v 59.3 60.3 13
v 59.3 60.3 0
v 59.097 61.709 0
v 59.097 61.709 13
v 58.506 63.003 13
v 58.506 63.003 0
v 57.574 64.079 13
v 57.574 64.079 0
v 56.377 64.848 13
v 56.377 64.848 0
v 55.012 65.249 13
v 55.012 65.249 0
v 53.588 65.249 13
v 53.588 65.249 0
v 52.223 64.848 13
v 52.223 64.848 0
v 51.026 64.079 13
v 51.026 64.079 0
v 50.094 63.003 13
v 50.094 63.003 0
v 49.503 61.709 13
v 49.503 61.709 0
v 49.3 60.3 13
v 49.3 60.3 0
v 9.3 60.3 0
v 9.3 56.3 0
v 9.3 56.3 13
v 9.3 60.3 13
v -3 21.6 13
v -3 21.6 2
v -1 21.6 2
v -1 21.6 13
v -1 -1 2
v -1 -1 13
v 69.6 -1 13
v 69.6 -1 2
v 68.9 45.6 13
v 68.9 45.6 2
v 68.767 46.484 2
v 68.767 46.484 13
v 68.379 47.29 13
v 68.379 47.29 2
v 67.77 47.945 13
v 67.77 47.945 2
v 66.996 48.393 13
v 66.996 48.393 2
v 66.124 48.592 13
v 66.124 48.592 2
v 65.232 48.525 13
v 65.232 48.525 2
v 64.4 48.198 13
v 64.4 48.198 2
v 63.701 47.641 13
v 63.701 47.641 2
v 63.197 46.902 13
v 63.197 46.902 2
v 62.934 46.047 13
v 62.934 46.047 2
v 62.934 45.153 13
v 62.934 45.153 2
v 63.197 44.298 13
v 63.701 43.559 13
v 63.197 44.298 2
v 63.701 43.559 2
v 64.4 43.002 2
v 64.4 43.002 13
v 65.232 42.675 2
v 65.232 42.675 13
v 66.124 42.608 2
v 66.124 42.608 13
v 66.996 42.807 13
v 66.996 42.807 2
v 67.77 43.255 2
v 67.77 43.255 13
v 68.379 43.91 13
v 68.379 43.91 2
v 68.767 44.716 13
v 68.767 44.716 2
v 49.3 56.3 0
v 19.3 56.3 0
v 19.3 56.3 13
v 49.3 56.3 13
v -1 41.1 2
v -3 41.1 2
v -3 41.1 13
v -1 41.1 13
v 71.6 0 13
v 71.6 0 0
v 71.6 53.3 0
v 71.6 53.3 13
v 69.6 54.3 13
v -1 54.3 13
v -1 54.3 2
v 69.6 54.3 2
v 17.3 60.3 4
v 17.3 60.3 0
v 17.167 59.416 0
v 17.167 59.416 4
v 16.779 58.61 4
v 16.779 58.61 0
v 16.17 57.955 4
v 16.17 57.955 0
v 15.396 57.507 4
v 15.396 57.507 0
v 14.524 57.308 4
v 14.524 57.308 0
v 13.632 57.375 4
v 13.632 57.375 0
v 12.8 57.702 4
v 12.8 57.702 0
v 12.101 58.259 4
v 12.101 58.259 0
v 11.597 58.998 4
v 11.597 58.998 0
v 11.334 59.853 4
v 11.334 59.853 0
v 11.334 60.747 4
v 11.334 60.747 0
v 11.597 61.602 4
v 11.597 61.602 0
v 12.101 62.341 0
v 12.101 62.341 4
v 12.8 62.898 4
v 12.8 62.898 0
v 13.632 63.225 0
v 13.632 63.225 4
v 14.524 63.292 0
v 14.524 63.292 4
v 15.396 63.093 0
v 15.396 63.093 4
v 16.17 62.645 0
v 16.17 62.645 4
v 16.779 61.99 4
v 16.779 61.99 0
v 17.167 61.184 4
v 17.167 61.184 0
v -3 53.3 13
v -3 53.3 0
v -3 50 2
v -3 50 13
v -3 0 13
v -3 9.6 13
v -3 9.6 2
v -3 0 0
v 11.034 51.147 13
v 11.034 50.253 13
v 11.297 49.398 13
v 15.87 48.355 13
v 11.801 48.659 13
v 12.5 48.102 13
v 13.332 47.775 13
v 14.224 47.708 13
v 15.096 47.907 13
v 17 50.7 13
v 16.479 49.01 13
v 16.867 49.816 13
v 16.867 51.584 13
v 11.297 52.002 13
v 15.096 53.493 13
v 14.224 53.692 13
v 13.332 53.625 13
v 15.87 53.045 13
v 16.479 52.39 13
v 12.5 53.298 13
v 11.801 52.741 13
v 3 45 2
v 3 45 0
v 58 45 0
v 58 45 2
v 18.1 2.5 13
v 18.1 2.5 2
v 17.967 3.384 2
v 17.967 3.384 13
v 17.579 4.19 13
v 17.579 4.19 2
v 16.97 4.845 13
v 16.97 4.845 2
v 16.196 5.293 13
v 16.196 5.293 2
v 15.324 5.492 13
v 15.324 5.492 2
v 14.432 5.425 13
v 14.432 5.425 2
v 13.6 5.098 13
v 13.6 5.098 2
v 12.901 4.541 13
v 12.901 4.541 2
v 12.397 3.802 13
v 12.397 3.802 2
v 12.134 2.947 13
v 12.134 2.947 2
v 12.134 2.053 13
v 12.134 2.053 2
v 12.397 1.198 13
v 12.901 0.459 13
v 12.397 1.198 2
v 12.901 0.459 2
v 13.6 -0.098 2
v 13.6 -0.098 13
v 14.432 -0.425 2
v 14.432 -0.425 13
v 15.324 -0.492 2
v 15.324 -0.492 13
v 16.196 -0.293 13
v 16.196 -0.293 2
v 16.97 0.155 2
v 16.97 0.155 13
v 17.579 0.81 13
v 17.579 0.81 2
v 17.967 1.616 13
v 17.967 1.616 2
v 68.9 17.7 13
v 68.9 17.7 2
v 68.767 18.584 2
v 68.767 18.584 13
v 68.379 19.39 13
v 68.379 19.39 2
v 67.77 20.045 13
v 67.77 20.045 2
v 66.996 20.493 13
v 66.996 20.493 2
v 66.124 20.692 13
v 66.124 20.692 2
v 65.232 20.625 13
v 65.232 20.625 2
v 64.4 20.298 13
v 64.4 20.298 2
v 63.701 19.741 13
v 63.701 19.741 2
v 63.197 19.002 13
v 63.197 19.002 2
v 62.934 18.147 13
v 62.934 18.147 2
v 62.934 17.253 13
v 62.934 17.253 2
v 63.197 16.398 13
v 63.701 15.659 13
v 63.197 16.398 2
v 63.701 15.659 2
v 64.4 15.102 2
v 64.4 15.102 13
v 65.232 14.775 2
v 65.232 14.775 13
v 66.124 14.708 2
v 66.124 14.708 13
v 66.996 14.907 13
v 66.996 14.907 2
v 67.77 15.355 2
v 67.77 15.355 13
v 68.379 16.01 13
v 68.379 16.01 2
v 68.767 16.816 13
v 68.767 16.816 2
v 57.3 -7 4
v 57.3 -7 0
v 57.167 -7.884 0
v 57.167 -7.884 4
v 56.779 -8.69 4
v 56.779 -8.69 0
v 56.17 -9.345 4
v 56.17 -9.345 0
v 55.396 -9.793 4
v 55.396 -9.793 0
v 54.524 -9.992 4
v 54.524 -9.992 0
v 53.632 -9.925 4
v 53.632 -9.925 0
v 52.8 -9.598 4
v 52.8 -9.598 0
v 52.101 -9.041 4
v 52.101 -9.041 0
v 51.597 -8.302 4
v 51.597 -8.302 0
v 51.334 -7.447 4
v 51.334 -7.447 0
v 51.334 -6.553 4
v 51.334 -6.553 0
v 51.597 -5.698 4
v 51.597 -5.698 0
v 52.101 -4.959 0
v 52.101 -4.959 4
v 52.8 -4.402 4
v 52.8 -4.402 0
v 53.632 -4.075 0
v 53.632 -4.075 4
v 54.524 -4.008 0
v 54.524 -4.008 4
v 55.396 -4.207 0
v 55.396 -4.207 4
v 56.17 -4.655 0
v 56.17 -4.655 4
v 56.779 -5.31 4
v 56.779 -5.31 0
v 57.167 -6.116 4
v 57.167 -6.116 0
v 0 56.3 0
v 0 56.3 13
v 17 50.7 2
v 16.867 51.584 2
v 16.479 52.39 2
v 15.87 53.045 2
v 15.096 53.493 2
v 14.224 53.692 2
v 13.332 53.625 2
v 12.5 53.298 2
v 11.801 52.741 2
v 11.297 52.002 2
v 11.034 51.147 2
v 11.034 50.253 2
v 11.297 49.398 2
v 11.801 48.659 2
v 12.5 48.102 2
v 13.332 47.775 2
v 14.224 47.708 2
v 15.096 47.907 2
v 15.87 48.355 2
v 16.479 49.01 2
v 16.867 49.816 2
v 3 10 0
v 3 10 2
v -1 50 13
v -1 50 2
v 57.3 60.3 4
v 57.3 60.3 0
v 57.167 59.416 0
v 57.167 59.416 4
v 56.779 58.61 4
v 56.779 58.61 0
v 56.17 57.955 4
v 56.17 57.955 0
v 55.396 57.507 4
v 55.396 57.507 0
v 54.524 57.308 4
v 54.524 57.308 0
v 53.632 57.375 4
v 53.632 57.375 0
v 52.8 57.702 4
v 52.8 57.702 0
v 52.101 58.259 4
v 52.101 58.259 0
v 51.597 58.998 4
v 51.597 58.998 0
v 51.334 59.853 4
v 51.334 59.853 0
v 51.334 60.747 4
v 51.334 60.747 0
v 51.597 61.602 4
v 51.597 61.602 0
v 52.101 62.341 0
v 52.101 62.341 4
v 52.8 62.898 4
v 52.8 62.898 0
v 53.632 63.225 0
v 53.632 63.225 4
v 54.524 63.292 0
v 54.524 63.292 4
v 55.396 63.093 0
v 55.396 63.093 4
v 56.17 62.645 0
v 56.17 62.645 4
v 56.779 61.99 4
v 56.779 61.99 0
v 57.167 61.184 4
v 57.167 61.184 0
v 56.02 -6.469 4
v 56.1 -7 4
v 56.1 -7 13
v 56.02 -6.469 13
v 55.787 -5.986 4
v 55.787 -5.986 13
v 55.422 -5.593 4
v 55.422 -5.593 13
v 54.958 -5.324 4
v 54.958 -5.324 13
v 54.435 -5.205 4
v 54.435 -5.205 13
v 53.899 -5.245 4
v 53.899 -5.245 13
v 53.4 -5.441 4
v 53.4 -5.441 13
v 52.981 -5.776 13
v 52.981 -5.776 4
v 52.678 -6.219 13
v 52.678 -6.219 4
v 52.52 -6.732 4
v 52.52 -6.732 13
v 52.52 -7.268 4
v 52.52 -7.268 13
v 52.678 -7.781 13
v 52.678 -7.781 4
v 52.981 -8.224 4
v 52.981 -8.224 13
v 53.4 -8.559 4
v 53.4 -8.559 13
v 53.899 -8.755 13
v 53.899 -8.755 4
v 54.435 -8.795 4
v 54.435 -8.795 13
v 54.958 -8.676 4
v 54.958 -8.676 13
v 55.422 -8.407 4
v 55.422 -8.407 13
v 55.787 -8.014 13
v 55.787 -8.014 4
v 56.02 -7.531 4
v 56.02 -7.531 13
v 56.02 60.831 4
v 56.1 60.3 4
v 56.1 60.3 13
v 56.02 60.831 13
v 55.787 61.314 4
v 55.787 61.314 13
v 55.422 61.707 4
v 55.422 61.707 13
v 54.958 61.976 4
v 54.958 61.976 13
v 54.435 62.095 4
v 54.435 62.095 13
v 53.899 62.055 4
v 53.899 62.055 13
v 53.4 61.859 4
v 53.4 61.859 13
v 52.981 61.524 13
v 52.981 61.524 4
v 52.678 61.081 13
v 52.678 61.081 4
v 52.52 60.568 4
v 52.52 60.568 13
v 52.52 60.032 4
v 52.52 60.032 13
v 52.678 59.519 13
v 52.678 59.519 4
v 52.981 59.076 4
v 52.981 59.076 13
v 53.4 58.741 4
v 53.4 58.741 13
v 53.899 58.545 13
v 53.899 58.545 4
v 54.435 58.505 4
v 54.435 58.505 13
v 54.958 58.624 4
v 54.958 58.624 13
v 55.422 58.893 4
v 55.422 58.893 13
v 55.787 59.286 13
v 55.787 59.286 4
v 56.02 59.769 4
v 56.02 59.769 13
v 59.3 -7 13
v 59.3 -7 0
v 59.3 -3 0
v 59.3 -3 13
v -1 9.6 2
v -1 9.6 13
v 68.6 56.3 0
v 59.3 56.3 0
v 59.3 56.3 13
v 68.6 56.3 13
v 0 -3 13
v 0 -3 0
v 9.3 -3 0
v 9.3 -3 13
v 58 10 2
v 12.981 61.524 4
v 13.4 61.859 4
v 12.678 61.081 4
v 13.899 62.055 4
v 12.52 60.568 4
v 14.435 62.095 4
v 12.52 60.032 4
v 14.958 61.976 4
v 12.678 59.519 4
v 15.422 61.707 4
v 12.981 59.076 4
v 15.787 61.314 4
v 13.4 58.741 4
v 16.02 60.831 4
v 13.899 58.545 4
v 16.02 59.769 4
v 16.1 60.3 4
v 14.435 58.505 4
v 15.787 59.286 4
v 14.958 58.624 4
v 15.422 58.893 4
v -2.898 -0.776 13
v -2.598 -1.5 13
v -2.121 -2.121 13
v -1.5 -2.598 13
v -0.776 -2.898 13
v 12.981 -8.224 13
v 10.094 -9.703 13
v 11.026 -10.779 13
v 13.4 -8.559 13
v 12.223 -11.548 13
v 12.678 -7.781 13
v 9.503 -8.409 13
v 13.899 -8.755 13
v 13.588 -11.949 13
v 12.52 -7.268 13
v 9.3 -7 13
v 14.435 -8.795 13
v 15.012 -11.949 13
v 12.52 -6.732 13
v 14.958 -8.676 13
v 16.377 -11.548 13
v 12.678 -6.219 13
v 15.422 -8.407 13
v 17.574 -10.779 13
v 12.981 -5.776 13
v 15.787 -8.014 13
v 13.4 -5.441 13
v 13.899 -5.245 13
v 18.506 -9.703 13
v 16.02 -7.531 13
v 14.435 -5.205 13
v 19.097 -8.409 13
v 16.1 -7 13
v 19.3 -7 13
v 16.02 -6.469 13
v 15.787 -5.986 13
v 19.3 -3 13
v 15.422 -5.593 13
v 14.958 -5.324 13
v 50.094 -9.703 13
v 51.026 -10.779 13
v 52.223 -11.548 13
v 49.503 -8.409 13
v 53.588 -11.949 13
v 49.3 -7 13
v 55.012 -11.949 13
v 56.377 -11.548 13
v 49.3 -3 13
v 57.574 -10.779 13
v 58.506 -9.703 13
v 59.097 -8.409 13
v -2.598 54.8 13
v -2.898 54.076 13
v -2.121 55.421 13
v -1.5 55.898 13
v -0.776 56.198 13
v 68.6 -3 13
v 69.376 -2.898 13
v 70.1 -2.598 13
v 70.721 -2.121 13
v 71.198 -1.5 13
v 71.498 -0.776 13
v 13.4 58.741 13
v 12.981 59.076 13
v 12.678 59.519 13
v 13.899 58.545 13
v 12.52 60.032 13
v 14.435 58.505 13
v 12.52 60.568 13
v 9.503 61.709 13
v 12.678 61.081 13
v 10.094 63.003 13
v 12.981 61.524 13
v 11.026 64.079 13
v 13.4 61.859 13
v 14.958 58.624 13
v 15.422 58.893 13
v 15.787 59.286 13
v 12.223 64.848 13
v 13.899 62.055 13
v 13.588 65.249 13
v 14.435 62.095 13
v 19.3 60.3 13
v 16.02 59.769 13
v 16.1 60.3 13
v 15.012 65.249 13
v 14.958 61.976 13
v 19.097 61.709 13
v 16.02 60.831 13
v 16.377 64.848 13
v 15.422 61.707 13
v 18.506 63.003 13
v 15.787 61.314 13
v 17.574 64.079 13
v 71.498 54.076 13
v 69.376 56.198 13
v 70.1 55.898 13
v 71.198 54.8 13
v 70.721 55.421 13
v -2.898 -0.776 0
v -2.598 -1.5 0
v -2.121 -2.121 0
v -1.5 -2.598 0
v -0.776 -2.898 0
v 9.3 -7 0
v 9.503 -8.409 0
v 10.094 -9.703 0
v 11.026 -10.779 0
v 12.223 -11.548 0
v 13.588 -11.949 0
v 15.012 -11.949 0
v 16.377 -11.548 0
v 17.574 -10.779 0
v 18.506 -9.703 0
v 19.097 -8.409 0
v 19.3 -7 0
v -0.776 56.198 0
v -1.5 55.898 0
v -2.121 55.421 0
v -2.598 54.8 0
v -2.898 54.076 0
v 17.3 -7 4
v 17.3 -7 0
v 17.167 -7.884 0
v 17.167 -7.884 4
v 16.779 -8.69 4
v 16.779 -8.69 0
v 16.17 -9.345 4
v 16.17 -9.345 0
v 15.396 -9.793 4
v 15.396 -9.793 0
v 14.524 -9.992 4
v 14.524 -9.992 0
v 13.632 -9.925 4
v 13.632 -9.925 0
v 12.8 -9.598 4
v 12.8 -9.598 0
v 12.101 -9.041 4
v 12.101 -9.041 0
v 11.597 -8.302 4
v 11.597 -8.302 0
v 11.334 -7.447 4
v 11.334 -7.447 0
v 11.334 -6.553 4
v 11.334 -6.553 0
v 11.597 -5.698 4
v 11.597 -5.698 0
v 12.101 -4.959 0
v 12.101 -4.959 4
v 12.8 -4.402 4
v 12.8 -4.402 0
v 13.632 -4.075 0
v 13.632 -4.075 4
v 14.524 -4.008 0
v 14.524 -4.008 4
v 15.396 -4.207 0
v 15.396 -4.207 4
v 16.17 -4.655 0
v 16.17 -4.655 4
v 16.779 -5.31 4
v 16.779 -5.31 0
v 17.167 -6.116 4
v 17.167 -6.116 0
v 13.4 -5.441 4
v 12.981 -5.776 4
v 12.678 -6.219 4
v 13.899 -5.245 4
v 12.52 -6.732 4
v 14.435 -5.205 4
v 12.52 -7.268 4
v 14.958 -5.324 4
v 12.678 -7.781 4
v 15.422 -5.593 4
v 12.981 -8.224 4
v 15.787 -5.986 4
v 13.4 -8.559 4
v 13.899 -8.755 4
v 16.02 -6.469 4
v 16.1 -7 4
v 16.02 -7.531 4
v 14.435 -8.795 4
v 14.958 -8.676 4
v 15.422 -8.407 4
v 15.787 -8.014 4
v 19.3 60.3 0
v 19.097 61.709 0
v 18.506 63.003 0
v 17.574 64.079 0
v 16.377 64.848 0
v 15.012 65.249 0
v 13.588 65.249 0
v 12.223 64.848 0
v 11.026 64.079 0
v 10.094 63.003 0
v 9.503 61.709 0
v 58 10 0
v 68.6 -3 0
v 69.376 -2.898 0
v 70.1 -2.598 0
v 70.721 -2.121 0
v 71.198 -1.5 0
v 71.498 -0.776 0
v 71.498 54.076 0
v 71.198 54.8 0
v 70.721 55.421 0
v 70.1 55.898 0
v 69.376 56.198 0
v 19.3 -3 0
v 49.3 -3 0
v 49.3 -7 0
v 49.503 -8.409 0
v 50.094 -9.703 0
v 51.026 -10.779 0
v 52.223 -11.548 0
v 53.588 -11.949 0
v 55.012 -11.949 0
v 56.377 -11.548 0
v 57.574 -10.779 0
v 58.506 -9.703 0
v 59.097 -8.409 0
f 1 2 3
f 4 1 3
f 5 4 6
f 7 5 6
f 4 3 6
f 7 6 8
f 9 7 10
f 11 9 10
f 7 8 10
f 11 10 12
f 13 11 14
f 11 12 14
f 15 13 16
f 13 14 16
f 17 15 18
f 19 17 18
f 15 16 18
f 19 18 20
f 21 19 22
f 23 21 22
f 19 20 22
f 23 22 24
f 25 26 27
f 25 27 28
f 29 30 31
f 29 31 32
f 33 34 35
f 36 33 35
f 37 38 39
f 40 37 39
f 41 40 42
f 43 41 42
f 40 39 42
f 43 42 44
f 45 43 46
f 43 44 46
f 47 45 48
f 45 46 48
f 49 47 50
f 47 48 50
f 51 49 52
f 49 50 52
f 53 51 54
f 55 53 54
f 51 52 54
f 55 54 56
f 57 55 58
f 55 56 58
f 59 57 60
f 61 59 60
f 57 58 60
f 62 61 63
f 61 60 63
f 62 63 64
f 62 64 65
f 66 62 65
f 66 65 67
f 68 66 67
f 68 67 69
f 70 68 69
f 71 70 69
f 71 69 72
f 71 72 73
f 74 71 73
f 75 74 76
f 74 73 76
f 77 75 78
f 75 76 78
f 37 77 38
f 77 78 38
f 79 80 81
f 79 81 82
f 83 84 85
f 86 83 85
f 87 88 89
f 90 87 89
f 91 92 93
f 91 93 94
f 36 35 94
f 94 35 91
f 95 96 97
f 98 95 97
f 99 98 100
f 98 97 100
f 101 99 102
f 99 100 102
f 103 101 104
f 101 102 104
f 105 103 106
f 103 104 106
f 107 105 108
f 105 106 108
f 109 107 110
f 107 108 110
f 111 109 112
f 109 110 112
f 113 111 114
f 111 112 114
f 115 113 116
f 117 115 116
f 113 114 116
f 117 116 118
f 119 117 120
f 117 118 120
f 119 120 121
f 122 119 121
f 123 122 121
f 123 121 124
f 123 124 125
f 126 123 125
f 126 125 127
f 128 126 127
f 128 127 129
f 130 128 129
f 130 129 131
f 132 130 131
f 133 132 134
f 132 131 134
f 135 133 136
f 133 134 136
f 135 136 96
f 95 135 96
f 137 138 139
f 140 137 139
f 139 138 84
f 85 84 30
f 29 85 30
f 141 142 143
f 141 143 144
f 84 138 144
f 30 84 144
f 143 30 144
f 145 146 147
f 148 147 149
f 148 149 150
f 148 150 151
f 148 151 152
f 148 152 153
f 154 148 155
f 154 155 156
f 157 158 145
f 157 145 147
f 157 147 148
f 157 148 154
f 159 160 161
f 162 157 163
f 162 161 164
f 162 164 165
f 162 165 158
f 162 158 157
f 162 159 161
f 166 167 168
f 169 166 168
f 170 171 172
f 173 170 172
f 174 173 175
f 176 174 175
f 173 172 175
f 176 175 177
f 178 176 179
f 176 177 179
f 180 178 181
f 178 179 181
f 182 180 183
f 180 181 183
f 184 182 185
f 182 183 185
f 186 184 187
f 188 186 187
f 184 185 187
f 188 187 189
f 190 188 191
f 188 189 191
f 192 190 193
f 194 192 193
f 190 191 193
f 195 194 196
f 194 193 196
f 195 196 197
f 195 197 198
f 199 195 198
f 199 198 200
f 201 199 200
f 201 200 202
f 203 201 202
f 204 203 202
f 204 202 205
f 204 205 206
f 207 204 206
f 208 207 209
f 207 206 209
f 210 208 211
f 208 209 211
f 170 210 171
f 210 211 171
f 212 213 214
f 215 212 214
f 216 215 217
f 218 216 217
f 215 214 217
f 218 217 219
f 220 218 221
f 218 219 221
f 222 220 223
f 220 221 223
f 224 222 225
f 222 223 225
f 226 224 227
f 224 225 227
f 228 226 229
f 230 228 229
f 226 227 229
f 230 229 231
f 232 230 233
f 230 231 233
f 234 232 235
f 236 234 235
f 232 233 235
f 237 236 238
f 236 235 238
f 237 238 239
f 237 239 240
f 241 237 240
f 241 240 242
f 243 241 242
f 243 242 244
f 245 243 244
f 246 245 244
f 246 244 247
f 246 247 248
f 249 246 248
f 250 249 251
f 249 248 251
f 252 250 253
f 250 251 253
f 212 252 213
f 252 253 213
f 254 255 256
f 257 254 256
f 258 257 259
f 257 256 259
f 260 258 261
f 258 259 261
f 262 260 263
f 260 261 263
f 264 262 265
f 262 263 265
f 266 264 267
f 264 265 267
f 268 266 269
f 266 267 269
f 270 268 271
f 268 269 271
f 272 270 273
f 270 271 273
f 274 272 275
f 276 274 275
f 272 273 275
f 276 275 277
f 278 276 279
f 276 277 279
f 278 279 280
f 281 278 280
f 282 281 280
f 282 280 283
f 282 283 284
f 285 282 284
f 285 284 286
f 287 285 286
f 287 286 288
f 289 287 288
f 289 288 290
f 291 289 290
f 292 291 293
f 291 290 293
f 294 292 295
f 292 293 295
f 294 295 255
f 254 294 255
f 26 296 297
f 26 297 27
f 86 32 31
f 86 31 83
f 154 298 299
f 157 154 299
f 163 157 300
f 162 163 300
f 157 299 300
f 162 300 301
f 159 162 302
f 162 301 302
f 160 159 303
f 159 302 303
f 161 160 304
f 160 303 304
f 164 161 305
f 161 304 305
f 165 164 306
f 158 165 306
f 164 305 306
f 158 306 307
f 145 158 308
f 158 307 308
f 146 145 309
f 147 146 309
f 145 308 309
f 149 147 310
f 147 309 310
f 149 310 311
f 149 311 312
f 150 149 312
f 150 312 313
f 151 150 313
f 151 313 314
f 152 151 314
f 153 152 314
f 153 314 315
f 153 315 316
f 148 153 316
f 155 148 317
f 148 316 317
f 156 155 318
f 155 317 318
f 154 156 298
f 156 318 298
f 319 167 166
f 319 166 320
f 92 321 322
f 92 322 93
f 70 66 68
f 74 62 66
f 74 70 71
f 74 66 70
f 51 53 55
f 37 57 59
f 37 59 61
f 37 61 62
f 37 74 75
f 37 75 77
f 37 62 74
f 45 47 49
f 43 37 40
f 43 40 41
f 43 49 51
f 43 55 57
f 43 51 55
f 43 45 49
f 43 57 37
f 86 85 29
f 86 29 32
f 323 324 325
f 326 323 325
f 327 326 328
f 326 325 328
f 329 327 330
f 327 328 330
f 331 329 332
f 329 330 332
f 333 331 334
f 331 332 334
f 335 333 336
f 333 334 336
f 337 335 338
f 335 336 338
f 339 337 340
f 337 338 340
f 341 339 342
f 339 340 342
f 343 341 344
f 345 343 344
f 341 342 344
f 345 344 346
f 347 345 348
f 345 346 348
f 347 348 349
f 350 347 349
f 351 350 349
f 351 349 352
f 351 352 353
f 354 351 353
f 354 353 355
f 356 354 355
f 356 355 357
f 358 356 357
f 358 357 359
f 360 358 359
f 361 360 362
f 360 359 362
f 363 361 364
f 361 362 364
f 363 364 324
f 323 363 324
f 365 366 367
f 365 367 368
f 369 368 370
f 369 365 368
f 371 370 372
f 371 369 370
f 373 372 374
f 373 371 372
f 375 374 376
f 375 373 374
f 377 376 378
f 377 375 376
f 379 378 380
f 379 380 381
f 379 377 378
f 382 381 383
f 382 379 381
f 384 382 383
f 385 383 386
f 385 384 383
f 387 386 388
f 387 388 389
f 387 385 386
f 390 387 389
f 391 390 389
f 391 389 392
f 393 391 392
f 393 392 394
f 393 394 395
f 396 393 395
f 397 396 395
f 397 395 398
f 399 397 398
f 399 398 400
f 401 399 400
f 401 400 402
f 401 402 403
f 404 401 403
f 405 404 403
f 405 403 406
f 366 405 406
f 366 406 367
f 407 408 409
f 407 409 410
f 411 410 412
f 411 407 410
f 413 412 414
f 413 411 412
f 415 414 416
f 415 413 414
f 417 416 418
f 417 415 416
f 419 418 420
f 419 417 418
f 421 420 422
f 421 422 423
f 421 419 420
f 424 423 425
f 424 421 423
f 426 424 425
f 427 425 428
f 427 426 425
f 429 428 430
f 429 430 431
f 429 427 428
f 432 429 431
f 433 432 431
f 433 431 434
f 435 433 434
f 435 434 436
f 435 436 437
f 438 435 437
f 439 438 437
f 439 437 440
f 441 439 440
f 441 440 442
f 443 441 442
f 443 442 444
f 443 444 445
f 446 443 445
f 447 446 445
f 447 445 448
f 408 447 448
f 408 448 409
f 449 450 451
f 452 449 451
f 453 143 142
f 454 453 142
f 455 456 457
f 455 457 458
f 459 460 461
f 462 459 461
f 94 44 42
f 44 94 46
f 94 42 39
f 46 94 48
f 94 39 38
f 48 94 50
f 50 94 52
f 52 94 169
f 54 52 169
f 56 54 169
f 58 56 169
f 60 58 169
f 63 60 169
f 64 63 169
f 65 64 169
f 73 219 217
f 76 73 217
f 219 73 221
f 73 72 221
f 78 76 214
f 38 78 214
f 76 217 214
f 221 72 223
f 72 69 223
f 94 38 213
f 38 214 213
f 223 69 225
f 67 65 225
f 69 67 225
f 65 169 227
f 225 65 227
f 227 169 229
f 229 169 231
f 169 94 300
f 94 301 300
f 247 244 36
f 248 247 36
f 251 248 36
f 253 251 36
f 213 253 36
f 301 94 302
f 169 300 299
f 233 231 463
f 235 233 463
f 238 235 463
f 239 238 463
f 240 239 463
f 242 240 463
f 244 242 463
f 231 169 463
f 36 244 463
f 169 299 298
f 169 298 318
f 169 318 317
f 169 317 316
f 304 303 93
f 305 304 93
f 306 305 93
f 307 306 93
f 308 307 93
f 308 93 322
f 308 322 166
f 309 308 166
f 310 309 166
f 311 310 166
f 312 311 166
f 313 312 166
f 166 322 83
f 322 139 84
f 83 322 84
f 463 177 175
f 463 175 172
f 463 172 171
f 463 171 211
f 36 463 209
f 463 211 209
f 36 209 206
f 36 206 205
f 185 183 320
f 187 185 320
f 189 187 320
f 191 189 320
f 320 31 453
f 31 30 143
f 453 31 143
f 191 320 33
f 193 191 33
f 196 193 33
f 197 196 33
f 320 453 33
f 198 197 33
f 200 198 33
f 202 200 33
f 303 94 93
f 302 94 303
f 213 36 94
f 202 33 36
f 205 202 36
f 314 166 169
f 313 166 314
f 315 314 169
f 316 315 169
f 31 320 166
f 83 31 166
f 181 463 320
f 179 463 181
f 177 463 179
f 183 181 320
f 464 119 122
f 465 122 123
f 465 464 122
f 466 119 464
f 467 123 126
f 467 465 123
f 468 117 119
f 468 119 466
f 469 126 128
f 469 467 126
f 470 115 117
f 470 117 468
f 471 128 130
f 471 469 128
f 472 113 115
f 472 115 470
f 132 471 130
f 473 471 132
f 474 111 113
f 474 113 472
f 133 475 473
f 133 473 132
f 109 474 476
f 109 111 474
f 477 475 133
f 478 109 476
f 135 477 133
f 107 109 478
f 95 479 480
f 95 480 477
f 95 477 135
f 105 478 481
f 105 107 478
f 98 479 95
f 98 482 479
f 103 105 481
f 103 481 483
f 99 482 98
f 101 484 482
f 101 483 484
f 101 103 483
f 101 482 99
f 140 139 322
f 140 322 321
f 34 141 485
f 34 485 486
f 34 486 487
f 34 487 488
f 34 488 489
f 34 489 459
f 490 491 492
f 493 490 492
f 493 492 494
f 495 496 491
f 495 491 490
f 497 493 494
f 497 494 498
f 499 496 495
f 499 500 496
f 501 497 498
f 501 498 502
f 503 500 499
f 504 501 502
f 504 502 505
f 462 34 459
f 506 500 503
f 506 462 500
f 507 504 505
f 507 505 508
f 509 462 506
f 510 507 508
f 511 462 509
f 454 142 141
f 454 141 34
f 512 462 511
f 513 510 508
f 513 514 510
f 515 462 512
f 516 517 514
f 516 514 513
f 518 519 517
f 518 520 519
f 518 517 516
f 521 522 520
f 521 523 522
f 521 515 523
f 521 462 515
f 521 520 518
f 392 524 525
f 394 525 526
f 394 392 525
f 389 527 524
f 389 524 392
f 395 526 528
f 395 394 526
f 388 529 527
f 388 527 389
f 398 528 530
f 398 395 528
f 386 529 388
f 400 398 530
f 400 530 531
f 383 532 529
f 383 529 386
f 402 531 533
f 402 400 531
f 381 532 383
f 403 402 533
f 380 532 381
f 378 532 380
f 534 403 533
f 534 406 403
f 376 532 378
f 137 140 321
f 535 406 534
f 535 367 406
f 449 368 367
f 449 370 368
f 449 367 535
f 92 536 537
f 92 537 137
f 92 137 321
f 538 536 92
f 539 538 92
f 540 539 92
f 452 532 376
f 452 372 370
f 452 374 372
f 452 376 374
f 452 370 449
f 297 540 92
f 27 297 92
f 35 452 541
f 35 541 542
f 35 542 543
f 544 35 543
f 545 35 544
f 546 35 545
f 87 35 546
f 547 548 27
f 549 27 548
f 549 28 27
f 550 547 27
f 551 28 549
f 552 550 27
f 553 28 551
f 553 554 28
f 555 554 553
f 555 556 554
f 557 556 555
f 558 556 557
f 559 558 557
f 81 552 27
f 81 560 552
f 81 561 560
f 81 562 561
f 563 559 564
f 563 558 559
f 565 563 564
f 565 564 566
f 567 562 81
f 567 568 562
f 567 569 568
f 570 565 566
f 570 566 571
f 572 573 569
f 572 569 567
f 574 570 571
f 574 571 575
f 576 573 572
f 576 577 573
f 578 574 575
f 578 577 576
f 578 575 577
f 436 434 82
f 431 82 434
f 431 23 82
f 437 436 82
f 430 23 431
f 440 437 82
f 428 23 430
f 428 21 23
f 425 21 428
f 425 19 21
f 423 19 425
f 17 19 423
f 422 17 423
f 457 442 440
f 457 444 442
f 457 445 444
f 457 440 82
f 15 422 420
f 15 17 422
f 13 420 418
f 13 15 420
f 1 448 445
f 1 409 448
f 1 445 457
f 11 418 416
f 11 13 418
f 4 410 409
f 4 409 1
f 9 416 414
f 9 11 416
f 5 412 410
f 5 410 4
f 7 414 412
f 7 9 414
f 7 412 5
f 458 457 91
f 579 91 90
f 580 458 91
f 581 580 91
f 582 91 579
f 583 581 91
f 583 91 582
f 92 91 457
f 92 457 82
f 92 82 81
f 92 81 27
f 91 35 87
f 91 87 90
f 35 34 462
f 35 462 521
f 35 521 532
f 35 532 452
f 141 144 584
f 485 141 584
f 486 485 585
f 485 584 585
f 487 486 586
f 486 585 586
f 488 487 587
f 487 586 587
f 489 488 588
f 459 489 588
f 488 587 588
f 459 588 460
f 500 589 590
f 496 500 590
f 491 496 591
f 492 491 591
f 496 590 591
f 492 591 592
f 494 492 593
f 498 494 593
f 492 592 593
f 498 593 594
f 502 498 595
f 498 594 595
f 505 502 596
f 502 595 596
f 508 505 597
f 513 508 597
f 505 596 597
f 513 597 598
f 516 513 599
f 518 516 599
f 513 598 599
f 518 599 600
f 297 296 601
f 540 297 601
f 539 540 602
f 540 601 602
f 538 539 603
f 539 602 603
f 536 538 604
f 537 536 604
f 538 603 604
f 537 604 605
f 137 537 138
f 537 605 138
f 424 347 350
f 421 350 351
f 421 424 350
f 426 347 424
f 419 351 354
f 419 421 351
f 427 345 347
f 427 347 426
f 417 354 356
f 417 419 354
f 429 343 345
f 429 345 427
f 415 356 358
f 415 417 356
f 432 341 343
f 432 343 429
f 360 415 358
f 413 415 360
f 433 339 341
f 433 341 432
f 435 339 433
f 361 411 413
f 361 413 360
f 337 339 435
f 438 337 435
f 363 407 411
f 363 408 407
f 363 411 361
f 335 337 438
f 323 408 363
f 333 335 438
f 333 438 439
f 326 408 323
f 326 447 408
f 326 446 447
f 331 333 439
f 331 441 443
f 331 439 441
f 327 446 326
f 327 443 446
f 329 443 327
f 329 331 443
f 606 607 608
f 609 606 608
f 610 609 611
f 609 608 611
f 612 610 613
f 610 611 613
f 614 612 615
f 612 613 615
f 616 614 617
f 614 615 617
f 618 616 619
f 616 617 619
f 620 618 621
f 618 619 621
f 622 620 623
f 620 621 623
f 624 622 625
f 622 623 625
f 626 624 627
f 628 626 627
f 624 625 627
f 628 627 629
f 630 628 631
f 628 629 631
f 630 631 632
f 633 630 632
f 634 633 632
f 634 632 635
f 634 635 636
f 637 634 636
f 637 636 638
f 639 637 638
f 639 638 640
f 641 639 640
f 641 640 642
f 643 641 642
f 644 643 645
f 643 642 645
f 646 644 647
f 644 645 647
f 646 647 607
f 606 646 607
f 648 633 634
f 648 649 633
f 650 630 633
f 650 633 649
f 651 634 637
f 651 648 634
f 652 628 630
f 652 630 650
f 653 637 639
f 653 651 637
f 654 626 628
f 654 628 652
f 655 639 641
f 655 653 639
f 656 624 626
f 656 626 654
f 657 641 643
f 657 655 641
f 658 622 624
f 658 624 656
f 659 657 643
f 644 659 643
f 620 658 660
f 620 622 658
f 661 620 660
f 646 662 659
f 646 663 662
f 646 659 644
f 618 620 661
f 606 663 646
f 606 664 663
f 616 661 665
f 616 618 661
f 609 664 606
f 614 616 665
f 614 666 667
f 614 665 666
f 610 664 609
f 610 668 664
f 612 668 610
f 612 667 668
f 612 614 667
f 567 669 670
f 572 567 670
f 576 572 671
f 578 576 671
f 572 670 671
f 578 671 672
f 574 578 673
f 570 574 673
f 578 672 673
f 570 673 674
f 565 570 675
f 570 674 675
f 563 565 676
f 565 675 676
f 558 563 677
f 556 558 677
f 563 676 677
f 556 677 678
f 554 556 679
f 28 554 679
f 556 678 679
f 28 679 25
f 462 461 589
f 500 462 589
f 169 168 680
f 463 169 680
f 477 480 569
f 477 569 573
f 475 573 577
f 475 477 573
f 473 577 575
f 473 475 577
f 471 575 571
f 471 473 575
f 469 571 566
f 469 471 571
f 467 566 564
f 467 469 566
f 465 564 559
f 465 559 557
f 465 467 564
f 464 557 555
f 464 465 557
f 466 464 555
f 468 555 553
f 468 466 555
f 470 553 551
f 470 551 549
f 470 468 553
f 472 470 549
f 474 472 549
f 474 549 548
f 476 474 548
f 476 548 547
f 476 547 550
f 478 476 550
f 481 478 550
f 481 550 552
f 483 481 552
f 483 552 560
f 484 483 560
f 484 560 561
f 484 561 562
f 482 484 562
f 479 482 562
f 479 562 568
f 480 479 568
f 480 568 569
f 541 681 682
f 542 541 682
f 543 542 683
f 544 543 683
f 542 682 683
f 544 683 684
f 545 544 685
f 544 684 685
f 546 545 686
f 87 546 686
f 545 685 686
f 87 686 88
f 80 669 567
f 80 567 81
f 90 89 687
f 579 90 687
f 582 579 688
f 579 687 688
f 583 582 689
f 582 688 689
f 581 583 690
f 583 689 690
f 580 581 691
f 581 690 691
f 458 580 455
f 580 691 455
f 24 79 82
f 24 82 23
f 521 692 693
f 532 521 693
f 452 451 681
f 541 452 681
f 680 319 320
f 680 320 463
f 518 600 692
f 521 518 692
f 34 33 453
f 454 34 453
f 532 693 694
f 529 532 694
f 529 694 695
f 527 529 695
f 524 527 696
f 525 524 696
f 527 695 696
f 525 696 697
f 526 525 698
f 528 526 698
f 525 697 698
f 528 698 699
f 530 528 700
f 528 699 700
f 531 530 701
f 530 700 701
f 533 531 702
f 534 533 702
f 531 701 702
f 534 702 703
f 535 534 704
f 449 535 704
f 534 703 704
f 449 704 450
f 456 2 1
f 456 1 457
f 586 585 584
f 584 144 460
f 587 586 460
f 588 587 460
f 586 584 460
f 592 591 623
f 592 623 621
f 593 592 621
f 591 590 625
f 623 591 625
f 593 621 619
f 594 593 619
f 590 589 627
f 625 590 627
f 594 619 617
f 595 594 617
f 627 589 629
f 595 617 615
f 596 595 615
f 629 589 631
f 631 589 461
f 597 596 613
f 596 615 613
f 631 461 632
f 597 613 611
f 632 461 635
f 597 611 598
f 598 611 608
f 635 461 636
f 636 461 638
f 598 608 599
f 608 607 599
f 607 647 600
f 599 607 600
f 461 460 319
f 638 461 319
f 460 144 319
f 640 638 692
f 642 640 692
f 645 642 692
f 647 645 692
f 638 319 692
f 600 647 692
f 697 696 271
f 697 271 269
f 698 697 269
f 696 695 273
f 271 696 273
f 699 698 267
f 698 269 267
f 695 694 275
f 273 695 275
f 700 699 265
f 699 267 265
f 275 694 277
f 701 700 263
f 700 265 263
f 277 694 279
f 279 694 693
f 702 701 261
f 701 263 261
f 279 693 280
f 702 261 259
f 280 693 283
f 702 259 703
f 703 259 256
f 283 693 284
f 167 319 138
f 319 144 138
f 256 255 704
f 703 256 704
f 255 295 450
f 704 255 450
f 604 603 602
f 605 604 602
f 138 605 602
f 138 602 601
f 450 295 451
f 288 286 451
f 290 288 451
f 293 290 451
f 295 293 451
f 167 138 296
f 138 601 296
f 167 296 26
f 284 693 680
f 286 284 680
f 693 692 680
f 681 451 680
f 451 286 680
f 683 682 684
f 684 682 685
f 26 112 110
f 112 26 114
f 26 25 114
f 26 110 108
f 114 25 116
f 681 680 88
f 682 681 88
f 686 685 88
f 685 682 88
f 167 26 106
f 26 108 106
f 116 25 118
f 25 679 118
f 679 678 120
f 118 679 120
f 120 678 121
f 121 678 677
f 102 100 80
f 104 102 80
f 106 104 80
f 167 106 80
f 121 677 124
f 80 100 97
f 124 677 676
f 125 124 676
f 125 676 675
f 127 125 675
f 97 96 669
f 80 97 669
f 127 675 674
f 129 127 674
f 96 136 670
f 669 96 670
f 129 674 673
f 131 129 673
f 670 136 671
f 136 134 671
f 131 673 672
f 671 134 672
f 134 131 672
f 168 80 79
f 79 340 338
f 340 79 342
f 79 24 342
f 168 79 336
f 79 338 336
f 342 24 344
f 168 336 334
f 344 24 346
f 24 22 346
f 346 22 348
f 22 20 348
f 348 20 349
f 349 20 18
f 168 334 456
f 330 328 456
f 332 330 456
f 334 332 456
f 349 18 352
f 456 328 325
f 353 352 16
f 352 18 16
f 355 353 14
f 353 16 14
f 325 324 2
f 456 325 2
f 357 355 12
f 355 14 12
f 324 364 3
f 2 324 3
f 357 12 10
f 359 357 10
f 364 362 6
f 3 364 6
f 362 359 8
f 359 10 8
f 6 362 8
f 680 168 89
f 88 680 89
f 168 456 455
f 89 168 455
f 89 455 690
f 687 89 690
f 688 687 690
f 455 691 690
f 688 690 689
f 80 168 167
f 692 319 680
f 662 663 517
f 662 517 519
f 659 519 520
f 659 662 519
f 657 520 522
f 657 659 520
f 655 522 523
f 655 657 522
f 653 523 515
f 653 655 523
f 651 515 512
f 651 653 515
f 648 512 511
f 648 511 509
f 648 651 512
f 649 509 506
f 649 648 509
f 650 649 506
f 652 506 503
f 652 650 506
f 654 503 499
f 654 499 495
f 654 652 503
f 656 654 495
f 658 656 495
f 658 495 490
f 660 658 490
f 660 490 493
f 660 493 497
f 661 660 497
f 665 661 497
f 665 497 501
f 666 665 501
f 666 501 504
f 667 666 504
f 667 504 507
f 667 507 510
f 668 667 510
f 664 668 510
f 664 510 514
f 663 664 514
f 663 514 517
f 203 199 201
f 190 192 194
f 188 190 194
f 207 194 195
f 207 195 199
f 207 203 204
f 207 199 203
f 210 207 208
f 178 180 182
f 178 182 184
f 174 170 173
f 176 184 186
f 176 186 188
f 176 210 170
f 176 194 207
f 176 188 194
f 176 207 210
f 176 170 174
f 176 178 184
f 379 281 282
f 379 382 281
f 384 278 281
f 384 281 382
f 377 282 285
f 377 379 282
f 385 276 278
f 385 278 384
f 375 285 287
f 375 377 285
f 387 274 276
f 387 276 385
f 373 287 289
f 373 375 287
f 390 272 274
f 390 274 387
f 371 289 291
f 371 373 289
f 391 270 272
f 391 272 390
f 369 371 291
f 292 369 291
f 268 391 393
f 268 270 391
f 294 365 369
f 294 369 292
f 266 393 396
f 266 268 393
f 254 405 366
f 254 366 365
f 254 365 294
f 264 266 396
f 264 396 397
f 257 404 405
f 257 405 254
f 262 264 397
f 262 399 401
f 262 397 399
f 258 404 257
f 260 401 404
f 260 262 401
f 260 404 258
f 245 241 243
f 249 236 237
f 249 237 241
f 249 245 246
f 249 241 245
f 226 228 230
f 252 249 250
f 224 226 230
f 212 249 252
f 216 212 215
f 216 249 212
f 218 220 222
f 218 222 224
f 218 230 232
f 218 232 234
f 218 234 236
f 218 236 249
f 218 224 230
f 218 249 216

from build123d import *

# Parameters (mm, degrees)
SKETCH_R        = 1.8
PAD_DEPTH       = 13
SKETCH001_W     = 70.6
SKETCH001_H     = 55.3
POCKET_DEPTH    = 11
SKETCH002_R     = 3
PAD001_DEPTH    = 11
SKETCH004_R     = 3
POCKET001_DEPTH = 4
SKETCH005_R     = 3
POCKET002_DEPTH = 4
SKETCH007_W     = 12
SKETCH007_H     = 11
SKETCH007_W_2   = 8.9
POCKET003_DEPTH = 2
SKETCH008_W     = 55
SKETCH008_H     = 35
POCKET004_DEPTH = 5


with BuildPart() as part:
    # Sketch → Pad (new body)
    with BuildSketch(Plane.XY):
        with BuildLine():
            ThreePointArc((-3, 0), (-2.12132, -2.12132), (0, -3))
            Line((0, -3), (9.3, -3))
            Line((9.3, -3), (9.3, -7))
            ThreePointArc((9.3, -7), (14.3, -12), (19.3, -7))
            Line((19.3, -7), (19.3, -3))
            Line((19.3, -3), (49.3, -3))
            Line((49.3, -3), (49.3, -7))
            ThreePointArc((49.3, -7), (54.3, -12), (59.3, -7))
            Line((59.3, -7), (59.3, -3))
            Line((59.3, -3), (68.6, -3))
            ThreePointArc((68.6, -3), (70.72132, -2.12132), (71.6, 0))
            Line((71.6, 0), (71.6, 53.3))
            ThreePointArc((71.6, 53.3), (70.72132, 55.42132), (68.6, 56.3))
            Line((59.3, 56.3), (68.6, 56.3))
            Line((59.3, 60.3), (59.3, 56.3))
            ThreePointArc((59.3, 60.3), (54.3, 65.3), (49.3, 60.3))
            Line((49.3, 56.3), (49.3, 60.3))
            Line((19.3, 56.3), (49.3, 56.3))
            Line((19.3, 60.3), (19.3, 56.3))
            ThreePointArc((19.3, 60.3), (14.3, 65.3), (9.3, 60.3))
            Line((9.3, 56.3), (9.3, 60.3))
            Line((0, 56.3), (9.3, 56.3))
            ThreePointArc((0, 56.3), (-2.12132, 55.42132), (-3, 53.3))
            Line((-3, 53.3), (-3, 0))
        make_face()
        with Locations((14.3, -7)):
            Circle(SKETCH_R, mode=Mode.SUBTRACT)
        with Locations((54.3, -7)):
            Circle(SKETCH_R, mode=Mode.SUBTRACT)
        with Locations((54.3, 60.3)):
            Circle(SKETCH_R, mode=Mode.SUBTRACT)
        with Locations((14.3, 60.3)):
            Circle(SKETCH_R, mode=Mode.SUBTRACT)
    extrude(amount=PAD_DEPTH)

    # Sketch001 → Pocket (cut)
    with BuildSketch(Plane.XY.offset(13)):
        with Locations((34.3, 26.65)):
            Rectangle(SKETCH001_W, SKETCH001_H)
    extrude(amount=-POCKET_DEPTH, mode=Mode.SUBTRACT)

    # Sketch002 → Pad001 (new body)
    with BuildSketch(Plane.XY.offset(2)):
        with Locations((14, 50.7)):
            Circle(SKETCH002_R)
        with Locations((15.1, 2.5)):
            Circle(SKETCH002_R)
        with Locations((65.9, 45.6)):
            Circle(SKETCH002_R)
        with Locations((65.9, 17.7)):
            Circle(SKETCH002_R)
    extrude(amount=PAD001_DEPTH)

    # Sketch004 → Pocket001 (cut)
    with BuildSketch(Plane(origin=(0, 0, 0), x_dir=(1, 0, 0), z_dir=(0, 0, -1))):
        with Locations((54.3, 7)):
            Circle(SKETCH004_R)
        with Locations((14.3, 7)):
            Circle(SKETCH004_R)
    extrude(amount=-POCKET001_DEPTH, mode=Mode.SUBTRACT)

    # Sketch005 → Pocket002 (cut)
    with BuildSketch(Plane(origin=(0, 0, 0), x_dir=(1, 0, 0), z_dir=(0, 0, -1))):
        with Locations((54.3, -60.3)):
            Circle(SKETCH005_R)
        with Locations((14.3, -60.3)):
            Circle(SKETCH005_R)
    extrude(amount=-POCKET002_DEPTH, mode=Mode.SUBTRACT)

    # Sketch007 → Pocket003 (cut)
    with BuildSketch(Plane(origin=(-3, 0, 0), x_dir=(0, -1, 0), z_dir=(-1, 0, 0))):
        with Locations((-15.6, 7.5)):
            Rectangle(SKETCH007_W, SKETCH007_H)
        with Locations((-45.55, 7.5)):
            Rectangle(SKETCH007_W_2, SKETCH007_H)
    extrude(amount=-POCKET003_DEPTH, mode=Mode.SUBTRACT)

    # Sketch008 → Pocket004 (cut)
    with BuildSketch(Plane(origin=(0, 0, 0), x_dir=(1, 0, 0), z_dir=(0, 0, -1))):
        with Locations((30.5, -27.5)):
            Rectangle(SKETCH008_W, SKETCH008_H)
    extrude(amount=-POCKET004_DEPTH, mode=Mode.SUBTRACT)


solid = part.part
